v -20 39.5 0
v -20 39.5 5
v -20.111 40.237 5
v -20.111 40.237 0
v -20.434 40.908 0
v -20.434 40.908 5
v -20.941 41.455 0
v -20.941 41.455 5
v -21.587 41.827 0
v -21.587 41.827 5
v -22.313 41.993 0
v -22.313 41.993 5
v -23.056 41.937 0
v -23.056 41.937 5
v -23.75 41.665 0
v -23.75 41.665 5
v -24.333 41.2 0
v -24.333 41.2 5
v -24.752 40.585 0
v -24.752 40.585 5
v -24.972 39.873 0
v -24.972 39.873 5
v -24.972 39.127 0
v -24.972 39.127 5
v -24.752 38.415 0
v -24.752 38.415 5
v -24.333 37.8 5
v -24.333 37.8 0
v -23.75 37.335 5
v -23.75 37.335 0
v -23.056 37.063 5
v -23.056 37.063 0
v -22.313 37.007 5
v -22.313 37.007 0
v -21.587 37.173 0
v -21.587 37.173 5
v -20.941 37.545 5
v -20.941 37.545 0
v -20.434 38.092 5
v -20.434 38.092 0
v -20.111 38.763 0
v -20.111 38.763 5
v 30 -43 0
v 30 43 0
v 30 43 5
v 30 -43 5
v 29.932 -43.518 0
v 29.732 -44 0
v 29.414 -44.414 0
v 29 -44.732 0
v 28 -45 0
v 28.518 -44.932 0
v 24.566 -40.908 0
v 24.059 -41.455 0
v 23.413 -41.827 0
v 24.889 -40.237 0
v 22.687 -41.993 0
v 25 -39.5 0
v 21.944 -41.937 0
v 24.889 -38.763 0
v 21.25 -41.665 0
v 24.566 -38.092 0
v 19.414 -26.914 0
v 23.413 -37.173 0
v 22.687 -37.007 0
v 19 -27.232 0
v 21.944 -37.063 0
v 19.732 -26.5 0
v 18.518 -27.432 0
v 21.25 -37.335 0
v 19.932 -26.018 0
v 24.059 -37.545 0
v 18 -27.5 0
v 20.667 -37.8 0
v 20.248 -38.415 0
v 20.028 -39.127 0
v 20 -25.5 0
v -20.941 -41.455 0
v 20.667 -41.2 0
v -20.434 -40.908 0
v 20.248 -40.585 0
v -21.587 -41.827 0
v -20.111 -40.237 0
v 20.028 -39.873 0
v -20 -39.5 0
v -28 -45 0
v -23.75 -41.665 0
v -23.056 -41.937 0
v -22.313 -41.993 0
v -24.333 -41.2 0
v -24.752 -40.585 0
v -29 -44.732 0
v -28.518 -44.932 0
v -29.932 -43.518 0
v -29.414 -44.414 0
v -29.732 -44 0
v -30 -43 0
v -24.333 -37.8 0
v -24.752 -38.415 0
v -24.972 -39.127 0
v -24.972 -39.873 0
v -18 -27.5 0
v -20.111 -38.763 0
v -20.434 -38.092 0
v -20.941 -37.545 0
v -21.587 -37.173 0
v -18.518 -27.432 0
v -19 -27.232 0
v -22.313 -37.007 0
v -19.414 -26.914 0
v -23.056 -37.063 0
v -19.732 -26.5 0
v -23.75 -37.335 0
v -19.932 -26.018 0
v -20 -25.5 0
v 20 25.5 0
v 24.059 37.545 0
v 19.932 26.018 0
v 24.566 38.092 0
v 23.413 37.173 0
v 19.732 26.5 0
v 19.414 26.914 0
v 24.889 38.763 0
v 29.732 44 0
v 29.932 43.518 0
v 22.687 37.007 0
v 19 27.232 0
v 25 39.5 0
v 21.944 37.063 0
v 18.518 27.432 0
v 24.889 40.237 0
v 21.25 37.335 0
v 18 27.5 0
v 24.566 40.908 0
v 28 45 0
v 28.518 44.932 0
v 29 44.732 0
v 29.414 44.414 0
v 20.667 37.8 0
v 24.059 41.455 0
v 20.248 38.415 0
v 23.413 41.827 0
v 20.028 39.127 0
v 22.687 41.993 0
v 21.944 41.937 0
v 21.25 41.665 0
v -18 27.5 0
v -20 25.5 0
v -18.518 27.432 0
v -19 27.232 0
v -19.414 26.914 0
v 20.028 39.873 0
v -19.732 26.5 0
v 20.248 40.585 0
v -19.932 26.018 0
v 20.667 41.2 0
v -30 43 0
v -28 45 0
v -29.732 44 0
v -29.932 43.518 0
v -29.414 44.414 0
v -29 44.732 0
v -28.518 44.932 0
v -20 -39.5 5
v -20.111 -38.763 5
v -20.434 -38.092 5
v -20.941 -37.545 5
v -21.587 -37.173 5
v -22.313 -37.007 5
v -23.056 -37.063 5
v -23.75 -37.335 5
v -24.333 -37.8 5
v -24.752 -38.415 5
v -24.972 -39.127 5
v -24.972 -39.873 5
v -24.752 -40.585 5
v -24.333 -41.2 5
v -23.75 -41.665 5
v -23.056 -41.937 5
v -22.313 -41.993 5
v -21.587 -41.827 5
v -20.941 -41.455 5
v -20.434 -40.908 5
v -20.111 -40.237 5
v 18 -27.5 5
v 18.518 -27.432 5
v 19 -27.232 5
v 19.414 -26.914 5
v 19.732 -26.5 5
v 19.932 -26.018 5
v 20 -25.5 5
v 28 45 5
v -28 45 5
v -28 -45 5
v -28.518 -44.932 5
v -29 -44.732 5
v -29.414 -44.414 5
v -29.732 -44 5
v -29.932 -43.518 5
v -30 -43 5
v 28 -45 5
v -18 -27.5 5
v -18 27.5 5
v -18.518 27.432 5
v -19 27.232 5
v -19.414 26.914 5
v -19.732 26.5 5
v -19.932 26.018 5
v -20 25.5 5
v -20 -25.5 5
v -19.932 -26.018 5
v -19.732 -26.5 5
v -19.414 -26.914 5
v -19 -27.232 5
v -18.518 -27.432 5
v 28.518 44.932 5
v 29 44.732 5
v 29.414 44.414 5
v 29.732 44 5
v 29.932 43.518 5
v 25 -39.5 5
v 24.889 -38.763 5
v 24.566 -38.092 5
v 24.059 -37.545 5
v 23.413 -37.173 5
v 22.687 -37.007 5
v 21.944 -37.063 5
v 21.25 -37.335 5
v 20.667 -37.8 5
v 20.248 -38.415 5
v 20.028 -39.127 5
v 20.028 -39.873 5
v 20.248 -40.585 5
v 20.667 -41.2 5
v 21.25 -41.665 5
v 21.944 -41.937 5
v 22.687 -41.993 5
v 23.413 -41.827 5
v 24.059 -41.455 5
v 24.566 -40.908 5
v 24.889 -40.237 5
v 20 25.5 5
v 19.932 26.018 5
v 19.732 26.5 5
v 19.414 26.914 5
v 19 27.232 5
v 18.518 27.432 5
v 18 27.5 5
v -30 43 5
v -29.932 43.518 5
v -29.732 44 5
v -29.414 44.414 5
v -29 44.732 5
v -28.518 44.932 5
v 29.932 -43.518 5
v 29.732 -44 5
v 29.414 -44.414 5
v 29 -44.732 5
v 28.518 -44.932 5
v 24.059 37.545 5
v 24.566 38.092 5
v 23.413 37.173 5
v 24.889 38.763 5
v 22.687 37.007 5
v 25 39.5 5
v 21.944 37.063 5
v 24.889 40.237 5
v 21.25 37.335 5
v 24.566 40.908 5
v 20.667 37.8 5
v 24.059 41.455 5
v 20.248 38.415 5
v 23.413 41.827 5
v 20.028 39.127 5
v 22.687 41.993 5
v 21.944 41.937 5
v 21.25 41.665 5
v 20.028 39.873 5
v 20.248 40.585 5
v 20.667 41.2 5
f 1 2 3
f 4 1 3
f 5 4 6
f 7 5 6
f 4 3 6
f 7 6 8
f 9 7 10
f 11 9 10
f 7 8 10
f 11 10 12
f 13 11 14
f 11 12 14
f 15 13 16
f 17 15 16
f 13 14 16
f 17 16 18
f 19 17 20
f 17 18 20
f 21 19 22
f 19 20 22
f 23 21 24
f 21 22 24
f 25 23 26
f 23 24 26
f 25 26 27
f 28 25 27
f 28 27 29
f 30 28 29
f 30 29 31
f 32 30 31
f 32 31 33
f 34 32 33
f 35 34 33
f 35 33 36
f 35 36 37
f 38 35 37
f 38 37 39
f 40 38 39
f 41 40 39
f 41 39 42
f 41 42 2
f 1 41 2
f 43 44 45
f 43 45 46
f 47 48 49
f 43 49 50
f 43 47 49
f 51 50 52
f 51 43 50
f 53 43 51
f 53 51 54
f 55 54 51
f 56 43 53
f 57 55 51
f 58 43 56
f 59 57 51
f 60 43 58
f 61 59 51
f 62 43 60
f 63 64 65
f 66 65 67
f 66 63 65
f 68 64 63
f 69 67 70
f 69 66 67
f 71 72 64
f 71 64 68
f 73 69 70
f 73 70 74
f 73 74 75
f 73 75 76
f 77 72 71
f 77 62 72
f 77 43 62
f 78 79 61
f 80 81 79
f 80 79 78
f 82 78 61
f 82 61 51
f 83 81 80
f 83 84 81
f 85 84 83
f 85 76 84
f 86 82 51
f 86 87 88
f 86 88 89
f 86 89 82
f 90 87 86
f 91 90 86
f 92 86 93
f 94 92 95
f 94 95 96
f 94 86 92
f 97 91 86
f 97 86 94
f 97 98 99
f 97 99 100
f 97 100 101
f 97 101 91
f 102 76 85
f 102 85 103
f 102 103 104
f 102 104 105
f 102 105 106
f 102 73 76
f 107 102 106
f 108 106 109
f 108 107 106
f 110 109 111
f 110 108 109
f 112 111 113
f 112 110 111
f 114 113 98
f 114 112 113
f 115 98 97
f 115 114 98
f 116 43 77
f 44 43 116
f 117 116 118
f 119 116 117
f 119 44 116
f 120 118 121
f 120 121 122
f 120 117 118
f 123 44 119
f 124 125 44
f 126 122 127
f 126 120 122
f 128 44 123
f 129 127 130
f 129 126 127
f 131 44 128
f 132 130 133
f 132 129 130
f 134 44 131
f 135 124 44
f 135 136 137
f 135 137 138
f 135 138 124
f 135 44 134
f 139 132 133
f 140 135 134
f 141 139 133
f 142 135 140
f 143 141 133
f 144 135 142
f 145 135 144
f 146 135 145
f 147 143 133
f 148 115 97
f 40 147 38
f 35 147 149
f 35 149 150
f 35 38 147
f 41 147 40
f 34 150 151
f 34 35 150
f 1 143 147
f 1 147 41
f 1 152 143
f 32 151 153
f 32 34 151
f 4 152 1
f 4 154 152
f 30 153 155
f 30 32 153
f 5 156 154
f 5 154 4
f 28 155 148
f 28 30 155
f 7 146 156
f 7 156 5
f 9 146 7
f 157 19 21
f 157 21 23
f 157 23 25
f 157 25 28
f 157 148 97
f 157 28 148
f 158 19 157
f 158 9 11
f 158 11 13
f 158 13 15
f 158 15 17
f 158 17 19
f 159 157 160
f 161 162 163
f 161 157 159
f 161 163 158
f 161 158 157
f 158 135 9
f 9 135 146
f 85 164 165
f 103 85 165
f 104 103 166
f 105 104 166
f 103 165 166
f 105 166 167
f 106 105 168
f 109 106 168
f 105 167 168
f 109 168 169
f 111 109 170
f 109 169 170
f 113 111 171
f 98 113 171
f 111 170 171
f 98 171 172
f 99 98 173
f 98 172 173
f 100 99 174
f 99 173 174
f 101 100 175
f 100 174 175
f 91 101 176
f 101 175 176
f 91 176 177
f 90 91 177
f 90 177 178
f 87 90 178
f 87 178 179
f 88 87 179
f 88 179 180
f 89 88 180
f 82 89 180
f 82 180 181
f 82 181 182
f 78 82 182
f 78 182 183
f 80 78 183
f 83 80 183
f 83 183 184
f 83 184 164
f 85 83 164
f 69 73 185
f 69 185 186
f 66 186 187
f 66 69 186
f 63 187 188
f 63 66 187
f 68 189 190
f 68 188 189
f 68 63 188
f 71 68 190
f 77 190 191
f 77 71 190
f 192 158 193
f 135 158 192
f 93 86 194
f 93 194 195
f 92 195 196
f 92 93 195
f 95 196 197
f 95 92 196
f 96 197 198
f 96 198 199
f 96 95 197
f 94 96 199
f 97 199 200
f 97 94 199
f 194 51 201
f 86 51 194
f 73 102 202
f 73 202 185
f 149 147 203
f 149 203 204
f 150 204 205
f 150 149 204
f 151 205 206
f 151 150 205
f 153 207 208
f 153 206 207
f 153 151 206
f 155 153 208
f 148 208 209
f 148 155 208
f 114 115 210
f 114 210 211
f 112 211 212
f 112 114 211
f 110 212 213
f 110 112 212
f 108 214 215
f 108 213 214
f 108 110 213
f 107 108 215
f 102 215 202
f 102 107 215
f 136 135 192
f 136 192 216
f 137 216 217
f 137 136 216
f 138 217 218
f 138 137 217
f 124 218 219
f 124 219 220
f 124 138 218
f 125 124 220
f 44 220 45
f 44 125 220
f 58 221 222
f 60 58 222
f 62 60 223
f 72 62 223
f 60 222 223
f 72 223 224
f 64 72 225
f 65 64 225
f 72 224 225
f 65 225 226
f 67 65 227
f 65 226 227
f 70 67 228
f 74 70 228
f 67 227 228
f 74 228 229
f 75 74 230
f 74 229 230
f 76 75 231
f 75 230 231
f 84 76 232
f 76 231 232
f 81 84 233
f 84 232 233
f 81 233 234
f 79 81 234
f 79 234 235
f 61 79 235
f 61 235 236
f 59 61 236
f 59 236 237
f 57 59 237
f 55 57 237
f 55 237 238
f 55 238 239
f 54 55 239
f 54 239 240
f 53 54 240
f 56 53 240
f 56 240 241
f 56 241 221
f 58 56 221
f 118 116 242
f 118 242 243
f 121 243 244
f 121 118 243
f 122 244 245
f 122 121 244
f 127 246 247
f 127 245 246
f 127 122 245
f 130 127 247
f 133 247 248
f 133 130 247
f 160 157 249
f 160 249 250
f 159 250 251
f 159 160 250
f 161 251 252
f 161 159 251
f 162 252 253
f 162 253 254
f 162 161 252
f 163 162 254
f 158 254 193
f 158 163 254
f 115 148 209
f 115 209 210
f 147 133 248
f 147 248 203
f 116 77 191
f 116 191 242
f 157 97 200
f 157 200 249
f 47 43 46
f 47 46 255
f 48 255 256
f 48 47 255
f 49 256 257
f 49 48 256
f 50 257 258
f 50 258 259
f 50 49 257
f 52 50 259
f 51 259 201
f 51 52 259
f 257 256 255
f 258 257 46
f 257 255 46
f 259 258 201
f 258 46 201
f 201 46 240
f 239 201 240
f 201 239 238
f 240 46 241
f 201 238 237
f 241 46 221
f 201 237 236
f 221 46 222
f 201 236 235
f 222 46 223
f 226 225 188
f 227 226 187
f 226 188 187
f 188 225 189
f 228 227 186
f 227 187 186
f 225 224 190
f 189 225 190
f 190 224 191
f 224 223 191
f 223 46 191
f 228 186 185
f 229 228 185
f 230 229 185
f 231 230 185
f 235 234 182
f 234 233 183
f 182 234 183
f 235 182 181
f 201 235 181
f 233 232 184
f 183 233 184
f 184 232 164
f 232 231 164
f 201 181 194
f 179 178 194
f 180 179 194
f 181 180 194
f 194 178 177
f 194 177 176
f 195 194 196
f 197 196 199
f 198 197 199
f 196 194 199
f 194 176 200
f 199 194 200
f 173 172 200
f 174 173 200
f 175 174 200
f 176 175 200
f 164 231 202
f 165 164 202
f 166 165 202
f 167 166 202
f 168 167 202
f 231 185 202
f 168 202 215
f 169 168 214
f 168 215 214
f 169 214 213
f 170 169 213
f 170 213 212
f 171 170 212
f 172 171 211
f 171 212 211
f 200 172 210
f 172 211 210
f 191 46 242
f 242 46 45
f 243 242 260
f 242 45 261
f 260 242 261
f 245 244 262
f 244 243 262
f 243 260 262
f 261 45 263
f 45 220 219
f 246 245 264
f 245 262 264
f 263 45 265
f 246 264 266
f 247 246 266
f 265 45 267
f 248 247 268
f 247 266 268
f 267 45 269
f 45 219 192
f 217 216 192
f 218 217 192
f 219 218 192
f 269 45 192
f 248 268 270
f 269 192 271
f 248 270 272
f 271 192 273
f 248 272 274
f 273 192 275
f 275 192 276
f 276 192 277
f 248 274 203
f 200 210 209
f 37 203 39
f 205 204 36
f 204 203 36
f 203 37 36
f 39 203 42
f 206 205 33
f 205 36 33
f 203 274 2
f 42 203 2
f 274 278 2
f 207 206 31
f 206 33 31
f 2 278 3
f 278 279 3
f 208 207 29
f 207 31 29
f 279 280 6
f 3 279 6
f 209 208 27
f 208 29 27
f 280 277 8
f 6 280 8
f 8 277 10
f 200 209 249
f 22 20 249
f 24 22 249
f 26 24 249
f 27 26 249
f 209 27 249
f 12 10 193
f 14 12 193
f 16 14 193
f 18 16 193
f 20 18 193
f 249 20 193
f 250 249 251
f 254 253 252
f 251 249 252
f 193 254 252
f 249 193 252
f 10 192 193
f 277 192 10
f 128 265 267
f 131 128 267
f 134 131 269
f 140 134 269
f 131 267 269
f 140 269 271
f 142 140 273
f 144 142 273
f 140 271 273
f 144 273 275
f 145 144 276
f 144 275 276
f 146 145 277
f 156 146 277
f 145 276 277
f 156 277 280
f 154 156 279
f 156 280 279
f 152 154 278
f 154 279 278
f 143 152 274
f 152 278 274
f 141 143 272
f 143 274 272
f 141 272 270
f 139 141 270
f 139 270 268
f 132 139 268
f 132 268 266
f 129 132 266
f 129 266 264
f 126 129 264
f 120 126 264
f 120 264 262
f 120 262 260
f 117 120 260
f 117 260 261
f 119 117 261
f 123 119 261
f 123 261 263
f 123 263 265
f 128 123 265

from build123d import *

# Parameters (mm, degrees)
BOSS_EXTRU_1_DEPTH      = 5
ENL_V_MAT_EXTRU_1_DEPTH = 55.313902456
ESQUISSE3_R             = 2.5
ENL_V_MAT_EXTRU_2_DEPTH = 55.313902456


with BuildPart() as part:
    # Esquisse1 → Boss.-Extru.1 (new body)
    with BuildSketch(Plane.XY):
        with BuildLine():
            Line((28, -45), (-28, -45))
            ThreePointArc((-28, -45), (-29.414213562, -44.414213562), (-30, -43))
            Line((-30, -43), (-30, 43))
            ThreePointArc((-30, 43), (-29.414213562, 44.414213562), (-28, 45))
            Line((-28, 45), (28, 45))
            ThreePointArc((28, 45), (29.414213562, 44.414213562), (30, 43))
            Line((30, 43), (30, -43))
            ThreePointArc((30, -43), (29.414213562, -44.414213562), (28, -45))
        make_face()
    extrude(amount=BOSS_EXTRU_1_DEPTH)

    # Esquisse2 → Enlèv. mat.-Extru.1 (cut, through all)
    with BuildSketch(Plane(origin=(0, 0, 0), x_dir=(-1, 0, 0), z_dir=(0, 0, -1))):
        with BuildLine():
            Line((18, -27.5), (-18, -27.5))
            ThreePointArc((-18, -27.5), (-19.414213562, -26.914213562), (-20, -25.5))
            Line((-20, -25.5), (-20, 25.5))
            ThreePointArc((-20, 25.5), (-19.414213562, 26.914213562), (-18, 27.5))
            Line((-18, 27.5), (18, 27.5))
            ThreePointArc((18, 27.5), (19.414213562, 26.914213562), (20, 25.5))
            Line((20, 25.5), (20, -25.5))
            ThreePointArc((20, -25.5), (19.414213562, -26.914213562), (18, -27.5))
        make_face()
    extrude(amount=-ENL_V_MAT_EXTRU_1_DEPTH, mode=Mode.SUBTRACT)

    # Esquisse3 → Enlèv. mat.-Extru.2 (cut, through all)
    with BuildSketch(Plane.XY.offset(5)):
        with Locations((-22.5, -39.5)):
            Circle(ESQUISSE3_R)
        with Locations((22.5, -39.5)):
            Circle(ESQUISSE3_R)
        with Locations((-22.5, 39.5)):
            Circle(ESQUISSE3_R)
        with Locations((22.5, 39.5)):
            Circle(ESQUISSE3_R)
    extrude(amount=-ENL_V_MAT_EXTRU_2_DEPTH, mode=Mode.SUBTRACT)


solid = part.part
